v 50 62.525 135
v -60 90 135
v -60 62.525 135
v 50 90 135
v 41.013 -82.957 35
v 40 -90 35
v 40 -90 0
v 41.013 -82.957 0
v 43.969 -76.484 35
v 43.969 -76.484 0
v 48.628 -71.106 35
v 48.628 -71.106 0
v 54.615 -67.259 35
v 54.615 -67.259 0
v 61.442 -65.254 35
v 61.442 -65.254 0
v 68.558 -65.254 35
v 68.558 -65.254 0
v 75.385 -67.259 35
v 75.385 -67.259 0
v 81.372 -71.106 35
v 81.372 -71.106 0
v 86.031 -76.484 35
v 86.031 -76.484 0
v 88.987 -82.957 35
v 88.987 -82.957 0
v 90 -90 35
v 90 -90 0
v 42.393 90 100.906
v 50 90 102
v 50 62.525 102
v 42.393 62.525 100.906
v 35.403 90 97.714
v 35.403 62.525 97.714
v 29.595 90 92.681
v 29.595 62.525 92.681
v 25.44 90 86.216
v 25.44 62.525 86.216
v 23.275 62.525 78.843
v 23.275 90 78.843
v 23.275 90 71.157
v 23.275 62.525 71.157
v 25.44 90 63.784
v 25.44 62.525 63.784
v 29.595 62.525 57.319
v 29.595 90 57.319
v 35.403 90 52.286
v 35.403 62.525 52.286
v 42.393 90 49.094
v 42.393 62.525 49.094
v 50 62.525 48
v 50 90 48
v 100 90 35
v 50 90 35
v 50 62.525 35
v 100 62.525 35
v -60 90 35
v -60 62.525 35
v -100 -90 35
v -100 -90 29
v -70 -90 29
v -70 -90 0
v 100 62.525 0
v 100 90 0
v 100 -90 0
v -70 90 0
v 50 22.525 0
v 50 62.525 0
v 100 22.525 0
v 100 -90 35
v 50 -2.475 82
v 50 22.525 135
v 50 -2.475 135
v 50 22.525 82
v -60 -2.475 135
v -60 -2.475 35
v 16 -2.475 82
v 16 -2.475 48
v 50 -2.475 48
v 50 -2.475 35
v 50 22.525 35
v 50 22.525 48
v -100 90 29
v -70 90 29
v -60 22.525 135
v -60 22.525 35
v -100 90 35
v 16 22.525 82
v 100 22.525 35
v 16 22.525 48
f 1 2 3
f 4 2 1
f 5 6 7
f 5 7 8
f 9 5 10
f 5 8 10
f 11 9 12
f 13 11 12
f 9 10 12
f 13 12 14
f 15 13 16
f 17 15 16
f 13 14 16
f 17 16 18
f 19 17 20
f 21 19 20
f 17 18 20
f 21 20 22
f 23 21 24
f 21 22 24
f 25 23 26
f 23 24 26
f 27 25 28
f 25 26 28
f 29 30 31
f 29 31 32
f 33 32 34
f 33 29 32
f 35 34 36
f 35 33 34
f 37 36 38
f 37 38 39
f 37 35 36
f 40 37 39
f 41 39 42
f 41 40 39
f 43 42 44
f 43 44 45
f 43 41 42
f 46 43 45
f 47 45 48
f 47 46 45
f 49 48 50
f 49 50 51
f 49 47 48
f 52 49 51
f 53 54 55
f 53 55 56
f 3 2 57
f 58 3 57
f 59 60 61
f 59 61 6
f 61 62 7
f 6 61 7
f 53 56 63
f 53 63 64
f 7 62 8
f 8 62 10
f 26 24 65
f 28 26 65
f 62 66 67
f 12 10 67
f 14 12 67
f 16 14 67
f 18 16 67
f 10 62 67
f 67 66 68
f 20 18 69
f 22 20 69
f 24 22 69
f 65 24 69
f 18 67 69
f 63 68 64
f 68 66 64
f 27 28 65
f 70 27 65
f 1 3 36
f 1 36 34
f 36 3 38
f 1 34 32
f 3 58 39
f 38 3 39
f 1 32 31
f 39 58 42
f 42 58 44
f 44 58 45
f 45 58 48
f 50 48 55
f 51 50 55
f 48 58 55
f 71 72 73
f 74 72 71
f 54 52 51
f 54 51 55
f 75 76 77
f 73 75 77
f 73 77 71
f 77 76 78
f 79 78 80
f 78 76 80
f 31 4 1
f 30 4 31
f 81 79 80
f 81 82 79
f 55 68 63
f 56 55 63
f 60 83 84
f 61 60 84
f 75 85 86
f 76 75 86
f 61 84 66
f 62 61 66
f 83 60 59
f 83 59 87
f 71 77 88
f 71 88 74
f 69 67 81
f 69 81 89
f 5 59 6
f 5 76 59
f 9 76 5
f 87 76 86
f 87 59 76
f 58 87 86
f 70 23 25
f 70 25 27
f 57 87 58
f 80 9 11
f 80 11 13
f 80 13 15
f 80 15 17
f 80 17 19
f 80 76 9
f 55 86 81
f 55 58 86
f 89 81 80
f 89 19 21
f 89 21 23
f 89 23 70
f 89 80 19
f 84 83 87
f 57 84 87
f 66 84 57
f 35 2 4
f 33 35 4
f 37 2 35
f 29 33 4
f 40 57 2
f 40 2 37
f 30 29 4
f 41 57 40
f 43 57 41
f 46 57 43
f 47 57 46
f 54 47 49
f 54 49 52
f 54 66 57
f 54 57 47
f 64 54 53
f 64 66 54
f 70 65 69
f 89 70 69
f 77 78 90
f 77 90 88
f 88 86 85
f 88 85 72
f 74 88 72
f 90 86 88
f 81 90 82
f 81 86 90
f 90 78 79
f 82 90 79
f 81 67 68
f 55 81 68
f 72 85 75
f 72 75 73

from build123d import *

# Parameters (mm, degrees)
SKETCH_1_W          = 200
SKETCH_1_H          = 180
EXTRUDE_3_DEPTH     = 35
SKETCH_1_3_W        = 50
SKETCH_1_3_H        = 40
CUT_EXTRUDE_2_DEPTH = 140.014387745
SKETCH_4_W          = 110
SKETCH_4_H          = 100
EXTRUDE_4_DEPTH     = 27.474741722
EXTRUDE_START       = -67.474742
SKETCH_4_4_W        = 110
SKETCH_4_4_H        = 100
EXTRUDE_5_DEPTH     = 25
SKETCH_9_W          = 30
SKETCH_9_H          = 29
CUT_EXTRUDE_5_DEPTH = 247.221445045
CUT_EXTRUDE_6_DEPTH = 27.474741722
SKETCH_11_W         = 34
SKETCH_11_H         = 34
CUT_EXTRUDE_7_DEPTH = 25


with BuildPart() as part:
    # Эскиз1 → Бобышка-Вытянуть3 (new body)
    with BuildSketch(Plane.XY):
        Rectangle(SKETCH_1_W, SKETCH_1_H)
    extrude(amount=EXTRUDE_3_DEPTH)

    # Эскиз1<3> → Вырез-Вытянуть2 (cut, through all)
    with BuildSketch(Plane.XY):
        with BuildLine():
            ThreePointArc((40, -90), (65, -65), (90, -90))
            Line((90, -90), (40, -90))
        make_face()
        with Locations((75, 42.525258278)):
            Rectangle(SKETCH_1_3_W, SKETCH_1_3_H)
    extrude(amount=CUT_EXTRUDE_2_DEPTH, mode=Mode.SUBTRACT)

    # Эскиз4 → Бобышка-Вытянуть4 (add)
    with BuildSketch(Plane(origin=(0, 90, 0), x_dir=(1, 0, 0), z_dir=(0, 1, 0))):
        with Locations((-5, -85)):
            Rectangle(SKETCH_4_W, SKETCH_4_H)
    extrude(amount=-EXTRUDE_4_DEPTH)

    # Эскиз4<4> → Бобышка-Вытянуть5 (add)
    with BuildSketch(Plane(origin=(0, 90, 0), x_dir=(1, 0, 0), z_dir=(0, 1, 0)).offset(EXTRUDE_START)):
        with Locations((-5, -85)):
            Rectangle(SKETCH_4_4_W, SKETCH_4_4_H)
    extrude(amount=-EXTRUDE_5_DEPTH)

    # Эскиз9 → Вырез-Вытянуть5 (cut, through all)
    with BuildSketch(Plane(origin=(0, 90, 0), x_dir=(1, 0, 0), z_dir=(0, 1, 0))):
        with Locations((-85, -14.5)):
            Rectangle(SKETCH_9_W, SKETCH_9_H)
    extrude(amount=-CUT_EXTRUDE_5_DEPTH, mode=Mode.SUBTRACT)

    # Эскиз10 → Вырез-Вытянуть6 (cut)
    with BuildSketch(Plane(origin=(0, 90, 0), x_dir=(1, 0, 0), z_dir=(0, 1, 0))):
        with BuildLine():
            Line((50, -48), (50, -102))
            ThreePointArc((50, -102), (23, -75), (50, -48))
        make_face()
    extrude(amount=-CUT_EXTRUDE_6_DEPTH, mode=Mode.SUBTRACT)

    # Эскиз11 → Вырез-Вытянуть7 (cut)
    with BuildSketch(Plane.XZ.offset(2.474741722)):
        with Locations((33, 65)):
            Rectangle(SKETCH_11_W, SKETCH_11_H)
    extrude(amount=-CUT_EXTRUDE_7_DEPTH, mode=Mode.SUBTRACT)


solid = part.part
